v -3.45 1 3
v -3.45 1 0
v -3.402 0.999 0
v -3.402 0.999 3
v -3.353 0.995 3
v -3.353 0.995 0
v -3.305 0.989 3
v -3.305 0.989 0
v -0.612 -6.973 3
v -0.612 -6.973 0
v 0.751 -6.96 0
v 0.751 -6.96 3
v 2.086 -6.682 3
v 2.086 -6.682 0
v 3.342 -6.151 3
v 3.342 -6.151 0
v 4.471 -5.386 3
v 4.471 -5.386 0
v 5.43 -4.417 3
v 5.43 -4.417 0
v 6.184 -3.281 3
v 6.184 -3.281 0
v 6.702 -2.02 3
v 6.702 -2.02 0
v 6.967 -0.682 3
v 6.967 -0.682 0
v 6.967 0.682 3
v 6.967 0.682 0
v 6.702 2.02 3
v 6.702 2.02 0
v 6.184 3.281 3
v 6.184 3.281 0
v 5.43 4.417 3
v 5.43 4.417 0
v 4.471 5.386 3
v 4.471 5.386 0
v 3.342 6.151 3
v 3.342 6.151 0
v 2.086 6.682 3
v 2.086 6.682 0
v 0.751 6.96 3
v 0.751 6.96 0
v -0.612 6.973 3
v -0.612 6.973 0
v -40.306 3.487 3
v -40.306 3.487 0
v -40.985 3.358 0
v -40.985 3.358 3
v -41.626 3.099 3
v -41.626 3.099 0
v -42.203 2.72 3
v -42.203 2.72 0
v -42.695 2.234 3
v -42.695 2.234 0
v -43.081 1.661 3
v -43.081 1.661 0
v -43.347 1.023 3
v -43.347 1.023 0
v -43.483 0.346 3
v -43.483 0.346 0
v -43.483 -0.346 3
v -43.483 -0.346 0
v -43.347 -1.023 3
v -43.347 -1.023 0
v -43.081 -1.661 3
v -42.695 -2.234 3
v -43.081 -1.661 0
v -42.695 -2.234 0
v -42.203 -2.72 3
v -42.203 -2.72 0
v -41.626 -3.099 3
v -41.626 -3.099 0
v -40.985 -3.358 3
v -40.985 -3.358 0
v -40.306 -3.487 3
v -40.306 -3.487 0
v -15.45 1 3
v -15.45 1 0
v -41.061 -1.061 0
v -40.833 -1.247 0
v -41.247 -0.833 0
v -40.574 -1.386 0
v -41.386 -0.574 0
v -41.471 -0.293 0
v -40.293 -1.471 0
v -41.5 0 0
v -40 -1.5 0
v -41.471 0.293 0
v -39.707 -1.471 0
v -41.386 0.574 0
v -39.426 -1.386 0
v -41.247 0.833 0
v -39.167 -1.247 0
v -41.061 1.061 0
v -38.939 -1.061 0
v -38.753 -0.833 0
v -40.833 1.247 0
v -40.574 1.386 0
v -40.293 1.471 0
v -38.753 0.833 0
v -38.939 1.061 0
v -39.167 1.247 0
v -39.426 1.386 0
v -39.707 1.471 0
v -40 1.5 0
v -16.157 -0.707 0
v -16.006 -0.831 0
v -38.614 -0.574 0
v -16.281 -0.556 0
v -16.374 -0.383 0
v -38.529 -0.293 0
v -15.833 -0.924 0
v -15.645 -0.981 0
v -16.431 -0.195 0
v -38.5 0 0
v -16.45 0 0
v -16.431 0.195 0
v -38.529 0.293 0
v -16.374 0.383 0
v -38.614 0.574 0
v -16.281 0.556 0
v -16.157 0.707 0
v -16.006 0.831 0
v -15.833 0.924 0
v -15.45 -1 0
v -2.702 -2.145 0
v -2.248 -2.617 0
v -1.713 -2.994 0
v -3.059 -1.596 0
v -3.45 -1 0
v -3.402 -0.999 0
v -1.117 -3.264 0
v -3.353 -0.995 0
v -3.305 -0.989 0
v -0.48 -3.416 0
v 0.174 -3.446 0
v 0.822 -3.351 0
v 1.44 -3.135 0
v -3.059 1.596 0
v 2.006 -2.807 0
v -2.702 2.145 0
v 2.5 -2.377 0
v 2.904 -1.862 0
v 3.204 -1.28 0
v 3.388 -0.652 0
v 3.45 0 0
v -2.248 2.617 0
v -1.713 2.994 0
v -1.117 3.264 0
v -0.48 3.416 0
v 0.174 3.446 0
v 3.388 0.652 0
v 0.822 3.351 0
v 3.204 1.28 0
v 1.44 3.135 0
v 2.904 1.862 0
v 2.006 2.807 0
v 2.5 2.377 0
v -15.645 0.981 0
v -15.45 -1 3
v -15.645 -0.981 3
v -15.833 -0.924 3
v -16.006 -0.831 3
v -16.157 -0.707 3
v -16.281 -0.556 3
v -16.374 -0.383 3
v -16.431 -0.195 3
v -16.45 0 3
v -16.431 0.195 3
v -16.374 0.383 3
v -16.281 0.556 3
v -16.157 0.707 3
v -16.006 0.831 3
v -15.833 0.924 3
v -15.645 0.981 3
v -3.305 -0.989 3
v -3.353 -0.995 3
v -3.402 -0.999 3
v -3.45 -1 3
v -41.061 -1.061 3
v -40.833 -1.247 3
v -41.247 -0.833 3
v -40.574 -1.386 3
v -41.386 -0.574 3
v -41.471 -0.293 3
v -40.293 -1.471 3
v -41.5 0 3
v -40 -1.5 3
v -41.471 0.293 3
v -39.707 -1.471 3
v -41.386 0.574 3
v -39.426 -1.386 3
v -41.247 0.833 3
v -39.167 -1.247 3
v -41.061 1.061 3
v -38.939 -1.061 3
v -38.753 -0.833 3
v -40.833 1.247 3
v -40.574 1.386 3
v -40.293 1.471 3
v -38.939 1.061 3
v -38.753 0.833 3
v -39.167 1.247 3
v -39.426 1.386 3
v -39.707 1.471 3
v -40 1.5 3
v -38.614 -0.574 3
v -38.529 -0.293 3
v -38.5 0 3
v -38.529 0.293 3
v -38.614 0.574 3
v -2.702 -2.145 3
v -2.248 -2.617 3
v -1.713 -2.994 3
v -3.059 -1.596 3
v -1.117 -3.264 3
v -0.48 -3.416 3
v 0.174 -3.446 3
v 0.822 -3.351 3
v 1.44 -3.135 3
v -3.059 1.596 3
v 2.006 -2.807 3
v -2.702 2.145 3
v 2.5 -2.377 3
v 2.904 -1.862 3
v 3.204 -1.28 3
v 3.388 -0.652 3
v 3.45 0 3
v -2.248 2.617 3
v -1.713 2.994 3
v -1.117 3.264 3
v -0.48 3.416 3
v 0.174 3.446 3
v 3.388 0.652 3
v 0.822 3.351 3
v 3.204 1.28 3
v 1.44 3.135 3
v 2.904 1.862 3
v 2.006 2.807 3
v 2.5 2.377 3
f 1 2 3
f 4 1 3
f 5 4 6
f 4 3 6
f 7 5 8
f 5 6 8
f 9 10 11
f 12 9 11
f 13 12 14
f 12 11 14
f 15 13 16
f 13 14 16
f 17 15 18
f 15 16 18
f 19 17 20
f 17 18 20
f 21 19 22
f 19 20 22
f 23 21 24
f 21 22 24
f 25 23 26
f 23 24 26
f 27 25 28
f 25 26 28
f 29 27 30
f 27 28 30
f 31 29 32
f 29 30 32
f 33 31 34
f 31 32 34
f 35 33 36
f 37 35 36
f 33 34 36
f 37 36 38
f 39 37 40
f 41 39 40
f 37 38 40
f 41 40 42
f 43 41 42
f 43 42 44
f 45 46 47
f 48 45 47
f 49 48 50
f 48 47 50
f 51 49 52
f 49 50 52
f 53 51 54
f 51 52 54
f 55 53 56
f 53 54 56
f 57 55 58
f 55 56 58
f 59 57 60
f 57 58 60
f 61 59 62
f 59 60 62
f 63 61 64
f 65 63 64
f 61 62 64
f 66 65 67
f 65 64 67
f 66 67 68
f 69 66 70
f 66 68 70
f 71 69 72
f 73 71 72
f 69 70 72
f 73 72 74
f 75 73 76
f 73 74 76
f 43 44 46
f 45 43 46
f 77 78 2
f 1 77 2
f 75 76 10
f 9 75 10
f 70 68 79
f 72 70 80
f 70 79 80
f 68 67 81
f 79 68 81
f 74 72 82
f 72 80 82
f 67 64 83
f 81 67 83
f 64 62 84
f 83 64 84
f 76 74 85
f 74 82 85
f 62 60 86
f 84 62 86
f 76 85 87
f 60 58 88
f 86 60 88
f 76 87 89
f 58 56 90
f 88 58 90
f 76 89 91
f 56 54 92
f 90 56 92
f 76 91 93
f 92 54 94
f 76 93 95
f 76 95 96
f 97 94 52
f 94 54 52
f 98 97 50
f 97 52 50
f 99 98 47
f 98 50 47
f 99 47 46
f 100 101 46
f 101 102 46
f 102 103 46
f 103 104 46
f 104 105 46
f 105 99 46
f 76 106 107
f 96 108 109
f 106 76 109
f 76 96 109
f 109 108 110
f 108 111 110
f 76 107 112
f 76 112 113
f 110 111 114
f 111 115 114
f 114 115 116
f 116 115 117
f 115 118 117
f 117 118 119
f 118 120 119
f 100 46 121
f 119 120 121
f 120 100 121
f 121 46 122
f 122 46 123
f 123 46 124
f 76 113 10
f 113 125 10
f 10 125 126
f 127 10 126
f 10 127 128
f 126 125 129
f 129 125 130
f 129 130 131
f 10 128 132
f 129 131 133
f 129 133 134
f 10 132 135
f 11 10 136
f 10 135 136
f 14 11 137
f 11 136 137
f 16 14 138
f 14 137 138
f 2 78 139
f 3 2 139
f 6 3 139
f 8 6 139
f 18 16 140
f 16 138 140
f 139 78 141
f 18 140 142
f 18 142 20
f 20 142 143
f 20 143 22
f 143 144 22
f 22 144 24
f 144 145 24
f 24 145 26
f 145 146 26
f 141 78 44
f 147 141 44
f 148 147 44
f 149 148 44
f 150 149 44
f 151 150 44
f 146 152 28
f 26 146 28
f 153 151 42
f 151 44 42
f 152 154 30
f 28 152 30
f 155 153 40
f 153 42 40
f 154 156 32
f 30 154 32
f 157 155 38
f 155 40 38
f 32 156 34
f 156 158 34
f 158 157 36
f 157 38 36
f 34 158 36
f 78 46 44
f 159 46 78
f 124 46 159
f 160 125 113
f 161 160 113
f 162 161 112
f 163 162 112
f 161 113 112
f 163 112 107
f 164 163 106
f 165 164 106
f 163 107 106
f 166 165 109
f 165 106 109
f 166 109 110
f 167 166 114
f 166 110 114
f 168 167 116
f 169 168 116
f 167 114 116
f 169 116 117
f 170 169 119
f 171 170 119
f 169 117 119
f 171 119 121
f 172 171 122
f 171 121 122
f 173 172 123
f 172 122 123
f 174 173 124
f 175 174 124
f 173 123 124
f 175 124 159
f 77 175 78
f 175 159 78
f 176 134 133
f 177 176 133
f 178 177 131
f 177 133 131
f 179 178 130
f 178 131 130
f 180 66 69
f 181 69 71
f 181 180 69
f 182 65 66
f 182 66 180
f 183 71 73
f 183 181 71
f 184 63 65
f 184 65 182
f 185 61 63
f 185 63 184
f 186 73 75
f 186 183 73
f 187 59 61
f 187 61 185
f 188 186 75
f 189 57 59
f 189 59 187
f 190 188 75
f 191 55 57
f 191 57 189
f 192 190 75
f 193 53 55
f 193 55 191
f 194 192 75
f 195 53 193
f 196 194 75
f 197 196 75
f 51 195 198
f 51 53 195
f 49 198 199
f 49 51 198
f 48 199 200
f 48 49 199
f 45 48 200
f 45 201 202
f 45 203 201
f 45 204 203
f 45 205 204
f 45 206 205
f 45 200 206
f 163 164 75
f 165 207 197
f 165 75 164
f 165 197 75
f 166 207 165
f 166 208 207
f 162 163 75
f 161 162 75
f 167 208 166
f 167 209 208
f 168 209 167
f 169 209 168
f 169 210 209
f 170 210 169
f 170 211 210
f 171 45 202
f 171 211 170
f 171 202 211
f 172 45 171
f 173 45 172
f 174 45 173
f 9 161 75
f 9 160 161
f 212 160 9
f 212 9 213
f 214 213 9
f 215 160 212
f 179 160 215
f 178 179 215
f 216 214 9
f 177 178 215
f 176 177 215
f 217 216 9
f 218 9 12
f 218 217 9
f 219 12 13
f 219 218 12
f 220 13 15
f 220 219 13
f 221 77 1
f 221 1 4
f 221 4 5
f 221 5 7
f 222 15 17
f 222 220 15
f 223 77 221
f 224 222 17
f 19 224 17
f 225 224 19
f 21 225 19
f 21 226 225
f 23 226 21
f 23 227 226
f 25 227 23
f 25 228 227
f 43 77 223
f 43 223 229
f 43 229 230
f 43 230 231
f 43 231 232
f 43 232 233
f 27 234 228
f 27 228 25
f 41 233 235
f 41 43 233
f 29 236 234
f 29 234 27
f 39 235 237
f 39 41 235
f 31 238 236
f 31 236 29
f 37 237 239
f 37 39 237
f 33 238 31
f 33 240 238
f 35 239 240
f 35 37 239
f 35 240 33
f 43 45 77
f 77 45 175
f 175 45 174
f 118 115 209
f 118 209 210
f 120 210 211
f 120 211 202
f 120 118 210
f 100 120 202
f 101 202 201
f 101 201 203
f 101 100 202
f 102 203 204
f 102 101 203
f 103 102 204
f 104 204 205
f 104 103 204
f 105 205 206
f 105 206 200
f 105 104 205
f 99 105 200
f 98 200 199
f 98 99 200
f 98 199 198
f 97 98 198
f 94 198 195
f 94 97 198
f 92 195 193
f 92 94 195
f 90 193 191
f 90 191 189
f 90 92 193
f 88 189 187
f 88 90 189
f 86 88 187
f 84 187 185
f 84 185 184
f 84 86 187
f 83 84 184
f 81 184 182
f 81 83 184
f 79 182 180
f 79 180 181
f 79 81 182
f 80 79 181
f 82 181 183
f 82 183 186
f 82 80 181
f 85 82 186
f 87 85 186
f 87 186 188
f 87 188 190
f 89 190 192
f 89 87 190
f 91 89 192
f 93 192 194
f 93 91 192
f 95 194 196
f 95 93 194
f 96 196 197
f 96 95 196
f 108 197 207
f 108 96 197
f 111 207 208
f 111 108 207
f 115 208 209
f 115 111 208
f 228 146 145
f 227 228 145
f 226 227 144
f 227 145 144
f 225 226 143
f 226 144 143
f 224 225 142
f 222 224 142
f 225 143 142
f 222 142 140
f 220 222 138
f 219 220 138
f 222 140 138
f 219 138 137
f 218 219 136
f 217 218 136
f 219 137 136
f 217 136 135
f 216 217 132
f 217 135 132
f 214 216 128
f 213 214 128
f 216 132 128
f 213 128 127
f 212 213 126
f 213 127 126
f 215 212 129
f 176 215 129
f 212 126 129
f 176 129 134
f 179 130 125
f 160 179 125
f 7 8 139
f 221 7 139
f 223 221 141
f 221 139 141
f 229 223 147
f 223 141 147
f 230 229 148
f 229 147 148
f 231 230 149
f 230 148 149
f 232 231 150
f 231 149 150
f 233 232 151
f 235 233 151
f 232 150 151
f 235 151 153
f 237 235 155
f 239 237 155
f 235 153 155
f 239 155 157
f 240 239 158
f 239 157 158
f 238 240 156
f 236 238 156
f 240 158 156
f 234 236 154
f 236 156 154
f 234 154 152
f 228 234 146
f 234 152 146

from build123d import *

# Parameters (mm, degrees)
SKETCH1_R           = 1.5
BOSS_EXTRUDE1_DEPTH = 3


with BuildPart() as part:
    # Sketch1 → Boss-Extrude1 (new body)
    with BuildSketch(Plane.XY):
        with BuildLine():
            Line((-0.6125, 6.973151637), (-40.30625, 3.486575818))
            ThreePointArc((-40.30625, 3.486575818), (-43.5, 0), (-40.30625, -3.486575818))
            Line((-40.30625, -3.486575818), (-0.6125, -6.973151637))
            ThreePointArc((-0.6125, -6.973151637), (7, 0), (-0.6125, 6.973151637))
        make_face()
        with Locations((-40, 0)):
            Circle(SKETCH1_R, mode=Mode.SUBTRACT)
        with BuildLine():
            ThreePointArc((-3.305072464, -0.989442272), (-3.377344208, -0.997357075), (-3.45, -1))
            Line((-3.45, -1), (-15.45, -1))
            ThreePointArc((-15.45, -1), (-16.45, 0), (-15.45, 1))
            Line((-15.45, 1), (-3.45, 1))
            ThreePointArc((-3.45, 1), (-3.377344208, 0.997357075), (-3.305072464, 0.989442272))
            ThreePointArc((-3.305072464, 0.989442272), (0.5, 3.413575838), (3.45, 0))
            ThreePointArc((3.45, 0), (0.5, -3.413575838), (-3.305072464, -0.989442272))
        make_face(mode=Mode.SUBTRACT)
    extrude(amount=BOSS_EXTRUDE1_DEPTH)


solid = part.part
